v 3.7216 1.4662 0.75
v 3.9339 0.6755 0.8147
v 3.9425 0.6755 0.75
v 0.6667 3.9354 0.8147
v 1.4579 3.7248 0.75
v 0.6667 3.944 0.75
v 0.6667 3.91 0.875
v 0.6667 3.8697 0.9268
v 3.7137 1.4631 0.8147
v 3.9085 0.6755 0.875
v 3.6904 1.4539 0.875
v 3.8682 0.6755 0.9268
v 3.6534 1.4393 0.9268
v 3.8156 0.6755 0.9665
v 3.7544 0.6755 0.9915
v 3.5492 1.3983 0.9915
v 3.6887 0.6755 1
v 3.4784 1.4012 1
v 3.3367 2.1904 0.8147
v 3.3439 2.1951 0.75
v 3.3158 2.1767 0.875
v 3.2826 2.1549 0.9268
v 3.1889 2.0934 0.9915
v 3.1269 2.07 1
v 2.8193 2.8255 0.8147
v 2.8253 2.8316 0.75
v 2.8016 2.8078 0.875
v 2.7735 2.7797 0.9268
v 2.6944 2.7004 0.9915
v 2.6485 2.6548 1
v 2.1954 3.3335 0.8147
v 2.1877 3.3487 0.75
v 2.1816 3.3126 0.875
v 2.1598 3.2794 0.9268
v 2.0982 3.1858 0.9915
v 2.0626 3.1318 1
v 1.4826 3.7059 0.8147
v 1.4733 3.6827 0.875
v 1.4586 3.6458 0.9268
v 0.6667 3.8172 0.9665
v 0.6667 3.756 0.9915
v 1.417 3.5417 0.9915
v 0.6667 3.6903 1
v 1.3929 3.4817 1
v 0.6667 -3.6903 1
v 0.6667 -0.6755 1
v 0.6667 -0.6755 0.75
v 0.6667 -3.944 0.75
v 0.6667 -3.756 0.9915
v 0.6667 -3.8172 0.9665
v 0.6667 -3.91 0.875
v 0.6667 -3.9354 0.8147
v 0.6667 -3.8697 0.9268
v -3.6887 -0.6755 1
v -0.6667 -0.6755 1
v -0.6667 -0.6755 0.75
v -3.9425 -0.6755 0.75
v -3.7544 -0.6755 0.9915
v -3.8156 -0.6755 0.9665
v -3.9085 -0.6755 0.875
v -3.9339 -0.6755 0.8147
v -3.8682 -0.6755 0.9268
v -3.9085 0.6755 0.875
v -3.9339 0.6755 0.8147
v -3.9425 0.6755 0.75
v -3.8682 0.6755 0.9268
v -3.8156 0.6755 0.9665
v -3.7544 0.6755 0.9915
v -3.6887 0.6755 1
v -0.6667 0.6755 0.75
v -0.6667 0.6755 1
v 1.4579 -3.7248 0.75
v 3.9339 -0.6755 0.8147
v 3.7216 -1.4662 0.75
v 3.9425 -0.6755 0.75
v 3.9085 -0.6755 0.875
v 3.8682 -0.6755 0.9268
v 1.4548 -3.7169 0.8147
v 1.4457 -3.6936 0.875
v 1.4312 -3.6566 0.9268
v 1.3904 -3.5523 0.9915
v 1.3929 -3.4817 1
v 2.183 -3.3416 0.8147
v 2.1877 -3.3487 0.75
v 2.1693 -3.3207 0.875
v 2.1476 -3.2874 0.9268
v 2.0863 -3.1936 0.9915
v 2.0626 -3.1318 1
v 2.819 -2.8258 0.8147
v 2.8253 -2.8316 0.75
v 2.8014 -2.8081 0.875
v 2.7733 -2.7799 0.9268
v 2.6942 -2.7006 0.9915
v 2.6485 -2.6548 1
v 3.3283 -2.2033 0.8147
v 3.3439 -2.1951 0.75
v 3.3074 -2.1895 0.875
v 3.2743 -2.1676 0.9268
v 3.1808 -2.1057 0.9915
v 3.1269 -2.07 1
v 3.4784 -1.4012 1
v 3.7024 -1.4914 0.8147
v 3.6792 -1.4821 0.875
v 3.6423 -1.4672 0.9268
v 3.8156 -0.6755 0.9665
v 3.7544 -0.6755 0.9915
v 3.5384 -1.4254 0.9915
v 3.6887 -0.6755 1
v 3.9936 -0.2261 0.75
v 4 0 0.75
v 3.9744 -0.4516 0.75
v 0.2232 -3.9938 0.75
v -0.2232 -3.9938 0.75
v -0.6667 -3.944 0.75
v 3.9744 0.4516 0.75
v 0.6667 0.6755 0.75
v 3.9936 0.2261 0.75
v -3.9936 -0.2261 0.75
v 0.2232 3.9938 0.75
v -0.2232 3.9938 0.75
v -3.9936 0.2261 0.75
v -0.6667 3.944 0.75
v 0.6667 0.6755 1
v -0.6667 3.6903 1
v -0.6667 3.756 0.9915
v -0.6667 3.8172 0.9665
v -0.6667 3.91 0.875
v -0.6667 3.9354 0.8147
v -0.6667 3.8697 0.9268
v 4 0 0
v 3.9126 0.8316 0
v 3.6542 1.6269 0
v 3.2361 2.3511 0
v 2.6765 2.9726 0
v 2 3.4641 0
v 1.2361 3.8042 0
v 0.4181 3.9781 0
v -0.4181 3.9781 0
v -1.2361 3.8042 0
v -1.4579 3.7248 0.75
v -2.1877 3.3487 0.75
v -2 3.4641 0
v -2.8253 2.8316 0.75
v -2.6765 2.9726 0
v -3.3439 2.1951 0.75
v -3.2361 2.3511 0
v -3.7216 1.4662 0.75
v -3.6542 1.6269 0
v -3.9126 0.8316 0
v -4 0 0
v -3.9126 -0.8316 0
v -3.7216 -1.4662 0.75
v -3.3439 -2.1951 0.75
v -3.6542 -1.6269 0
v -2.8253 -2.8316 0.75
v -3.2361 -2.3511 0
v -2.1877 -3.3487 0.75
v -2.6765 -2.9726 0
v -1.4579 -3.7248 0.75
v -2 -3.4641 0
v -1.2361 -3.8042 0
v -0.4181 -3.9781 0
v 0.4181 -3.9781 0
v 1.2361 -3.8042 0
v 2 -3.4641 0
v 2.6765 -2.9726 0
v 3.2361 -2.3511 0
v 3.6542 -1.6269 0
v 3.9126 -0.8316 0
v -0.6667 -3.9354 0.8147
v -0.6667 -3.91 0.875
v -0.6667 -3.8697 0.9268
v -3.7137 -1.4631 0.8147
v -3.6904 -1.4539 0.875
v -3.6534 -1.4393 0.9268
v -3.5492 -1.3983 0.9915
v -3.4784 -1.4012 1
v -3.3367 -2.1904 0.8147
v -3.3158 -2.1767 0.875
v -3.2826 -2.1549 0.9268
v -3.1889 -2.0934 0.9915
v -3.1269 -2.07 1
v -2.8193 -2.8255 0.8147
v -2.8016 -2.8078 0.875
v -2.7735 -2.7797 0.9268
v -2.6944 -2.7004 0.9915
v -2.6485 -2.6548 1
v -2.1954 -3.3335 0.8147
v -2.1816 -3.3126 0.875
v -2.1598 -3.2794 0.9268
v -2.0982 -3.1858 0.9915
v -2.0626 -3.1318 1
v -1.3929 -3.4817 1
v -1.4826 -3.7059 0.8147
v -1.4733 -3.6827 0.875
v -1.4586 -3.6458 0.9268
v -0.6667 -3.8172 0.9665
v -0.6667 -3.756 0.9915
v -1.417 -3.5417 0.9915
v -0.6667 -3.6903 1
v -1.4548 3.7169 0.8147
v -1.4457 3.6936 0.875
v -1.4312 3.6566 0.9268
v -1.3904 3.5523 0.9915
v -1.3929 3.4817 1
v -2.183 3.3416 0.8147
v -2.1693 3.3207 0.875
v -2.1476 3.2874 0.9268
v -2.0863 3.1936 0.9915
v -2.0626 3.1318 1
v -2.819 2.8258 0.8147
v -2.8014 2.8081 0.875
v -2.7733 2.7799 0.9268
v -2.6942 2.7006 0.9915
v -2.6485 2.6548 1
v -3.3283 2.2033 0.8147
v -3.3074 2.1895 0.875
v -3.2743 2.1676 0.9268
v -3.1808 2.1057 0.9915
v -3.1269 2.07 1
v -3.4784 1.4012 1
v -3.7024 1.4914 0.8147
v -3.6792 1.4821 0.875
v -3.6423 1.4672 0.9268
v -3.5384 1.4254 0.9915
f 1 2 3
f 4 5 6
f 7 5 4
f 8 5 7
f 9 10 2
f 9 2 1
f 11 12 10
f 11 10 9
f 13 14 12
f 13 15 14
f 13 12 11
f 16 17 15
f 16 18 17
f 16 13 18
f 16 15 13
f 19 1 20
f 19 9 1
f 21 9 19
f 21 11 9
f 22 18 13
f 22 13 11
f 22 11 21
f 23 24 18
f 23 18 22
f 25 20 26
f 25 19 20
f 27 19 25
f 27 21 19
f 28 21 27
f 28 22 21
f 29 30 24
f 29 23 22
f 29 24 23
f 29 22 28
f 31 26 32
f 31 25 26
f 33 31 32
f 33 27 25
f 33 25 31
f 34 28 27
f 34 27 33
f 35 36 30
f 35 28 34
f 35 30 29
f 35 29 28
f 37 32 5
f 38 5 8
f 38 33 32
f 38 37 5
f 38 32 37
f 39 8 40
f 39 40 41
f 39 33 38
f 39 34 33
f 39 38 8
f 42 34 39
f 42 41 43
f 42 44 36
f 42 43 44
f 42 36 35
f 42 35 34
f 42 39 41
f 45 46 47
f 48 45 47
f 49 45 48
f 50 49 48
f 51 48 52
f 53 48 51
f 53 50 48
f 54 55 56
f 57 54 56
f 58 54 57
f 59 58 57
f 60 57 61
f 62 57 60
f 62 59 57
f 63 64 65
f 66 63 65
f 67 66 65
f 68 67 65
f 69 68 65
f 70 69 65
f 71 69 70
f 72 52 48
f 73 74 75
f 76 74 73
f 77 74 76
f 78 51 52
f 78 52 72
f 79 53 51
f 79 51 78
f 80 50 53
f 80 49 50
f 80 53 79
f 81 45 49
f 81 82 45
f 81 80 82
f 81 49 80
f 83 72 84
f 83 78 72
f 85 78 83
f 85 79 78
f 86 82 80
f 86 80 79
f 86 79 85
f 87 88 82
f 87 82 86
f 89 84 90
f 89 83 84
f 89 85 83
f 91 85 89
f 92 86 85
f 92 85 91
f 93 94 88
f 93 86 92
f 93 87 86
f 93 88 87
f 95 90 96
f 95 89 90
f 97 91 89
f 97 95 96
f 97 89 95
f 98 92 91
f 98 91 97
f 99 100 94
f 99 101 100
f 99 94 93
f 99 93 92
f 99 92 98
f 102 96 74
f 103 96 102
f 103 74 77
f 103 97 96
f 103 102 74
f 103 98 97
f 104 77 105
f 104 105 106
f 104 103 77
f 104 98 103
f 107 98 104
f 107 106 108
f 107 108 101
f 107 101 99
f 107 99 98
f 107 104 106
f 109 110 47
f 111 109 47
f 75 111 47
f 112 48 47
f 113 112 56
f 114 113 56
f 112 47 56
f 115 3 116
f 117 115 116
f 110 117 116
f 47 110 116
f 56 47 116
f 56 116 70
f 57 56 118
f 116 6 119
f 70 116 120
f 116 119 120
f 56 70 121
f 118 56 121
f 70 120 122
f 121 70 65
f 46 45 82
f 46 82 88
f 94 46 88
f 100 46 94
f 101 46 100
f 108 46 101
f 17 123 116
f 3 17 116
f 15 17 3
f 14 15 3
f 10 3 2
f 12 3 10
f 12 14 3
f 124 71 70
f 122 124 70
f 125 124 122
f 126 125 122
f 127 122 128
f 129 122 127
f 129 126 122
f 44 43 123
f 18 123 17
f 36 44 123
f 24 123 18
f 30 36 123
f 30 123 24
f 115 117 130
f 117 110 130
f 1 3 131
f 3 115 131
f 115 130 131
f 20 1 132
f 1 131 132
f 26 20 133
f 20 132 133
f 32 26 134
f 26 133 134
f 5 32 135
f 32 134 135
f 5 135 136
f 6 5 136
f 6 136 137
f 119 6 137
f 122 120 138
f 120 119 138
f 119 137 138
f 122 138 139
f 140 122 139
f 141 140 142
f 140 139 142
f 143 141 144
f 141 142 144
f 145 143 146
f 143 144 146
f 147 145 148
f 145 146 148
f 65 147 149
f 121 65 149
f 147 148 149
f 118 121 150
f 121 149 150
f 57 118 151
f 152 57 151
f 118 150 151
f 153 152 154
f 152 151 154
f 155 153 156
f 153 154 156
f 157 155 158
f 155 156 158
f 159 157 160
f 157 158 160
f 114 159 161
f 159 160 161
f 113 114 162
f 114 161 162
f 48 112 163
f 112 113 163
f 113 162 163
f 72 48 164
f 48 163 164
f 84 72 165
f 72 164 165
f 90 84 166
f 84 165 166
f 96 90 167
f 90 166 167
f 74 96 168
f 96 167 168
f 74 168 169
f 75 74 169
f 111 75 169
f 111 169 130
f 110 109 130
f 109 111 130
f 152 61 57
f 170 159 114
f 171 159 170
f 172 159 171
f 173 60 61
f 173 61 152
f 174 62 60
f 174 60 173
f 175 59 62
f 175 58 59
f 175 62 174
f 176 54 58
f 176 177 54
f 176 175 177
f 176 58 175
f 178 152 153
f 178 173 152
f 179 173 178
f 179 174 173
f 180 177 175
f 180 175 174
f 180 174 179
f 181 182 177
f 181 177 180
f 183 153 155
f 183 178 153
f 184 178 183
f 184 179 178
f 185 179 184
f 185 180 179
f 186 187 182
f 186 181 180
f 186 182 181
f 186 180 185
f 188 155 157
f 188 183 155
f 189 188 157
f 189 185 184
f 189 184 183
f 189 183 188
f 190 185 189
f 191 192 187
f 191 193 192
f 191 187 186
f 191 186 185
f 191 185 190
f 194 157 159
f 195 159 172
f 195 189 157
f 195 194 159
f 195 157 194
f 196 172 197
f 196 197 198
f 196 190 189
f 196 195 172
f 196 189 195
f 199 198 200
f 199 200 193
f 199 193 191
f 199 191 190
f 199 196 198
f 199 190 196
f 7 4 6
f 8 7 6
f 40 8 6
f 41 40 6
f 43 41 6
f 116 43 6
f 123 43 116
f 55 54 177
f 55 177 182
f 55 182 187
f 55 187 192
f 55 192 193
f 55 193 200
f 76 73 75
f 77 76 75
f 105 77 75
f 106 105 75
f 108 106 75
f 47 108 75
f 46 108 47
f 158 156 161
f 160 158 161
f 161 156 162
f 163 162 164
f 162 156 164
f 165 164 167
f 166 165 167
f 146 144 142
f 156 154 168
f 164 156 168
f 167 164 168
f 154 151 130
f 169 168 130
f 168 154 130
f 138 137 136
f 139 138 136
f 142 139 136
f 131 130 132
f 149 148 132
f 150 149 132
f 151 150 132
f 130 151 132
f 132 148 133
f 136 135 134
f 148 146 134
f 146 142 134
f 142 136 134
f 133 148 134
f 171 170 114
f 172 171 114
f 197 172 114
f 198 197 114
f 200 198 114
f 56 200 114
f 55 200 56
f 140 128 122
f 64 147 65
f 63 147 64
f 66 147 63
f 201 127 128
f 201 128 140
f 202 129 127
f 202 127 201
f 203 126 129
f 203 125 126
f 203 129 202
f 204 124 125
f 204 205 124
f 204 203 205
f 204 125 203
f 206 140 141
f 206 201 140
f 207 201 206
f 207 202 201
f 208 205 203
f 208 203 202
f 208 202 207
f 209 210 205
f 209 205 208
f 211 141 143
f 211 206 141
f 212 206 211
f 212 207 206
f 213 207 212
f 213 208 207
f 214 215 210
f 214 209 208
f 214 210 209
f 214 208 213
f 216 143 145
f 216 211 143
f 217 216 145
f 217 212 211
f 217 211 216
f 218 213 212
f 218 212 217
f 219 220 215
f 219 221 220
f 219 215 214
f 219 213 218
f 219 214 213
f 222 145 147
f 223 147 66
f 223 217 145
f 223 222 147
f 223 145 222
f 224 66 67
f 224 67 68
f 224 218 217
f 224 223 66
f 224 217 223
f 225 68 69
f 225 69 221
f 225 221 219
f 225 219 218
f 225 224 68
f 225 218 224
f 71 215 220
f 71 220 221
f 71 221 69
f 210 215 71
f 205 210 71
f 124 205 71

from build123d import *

# Parameters (mm, degrees)
SKETCH1_R           = 4
BOSS_EXTRUDE1_DEPTH = 1
CUT_EXTRUDE1_DEPTH  = 0.25
FILLET1_R           = 0.25


with BuildPart() as part:
    # Sketch1 → Boss-Extrude1 (new body)
    with BuildSketch(Plane.XY):
        Circle(SKETCH1_R)
    extrude(amount=BOSS_EXTRUDE1_DEPTH)

    # Sketch2 → Cut-Extrude1 (cut)
    with BuildSketch(Plane.XY.offset(1)):
        Polygon((-8.106259115, 0.675521593), (-0.666748585, 0.675521593), (-0.666748585, 8.465952431), (0.666748585, 8.465952431), (0.666748585, 0.675521593), (8.106259115, 0.675521593), (8.106259115, -0.675521593), (0.666748585, -0.675521593), (0.666748585, -8.465952431), (-0.666748585, -8.465952431), (-0.666748585, -0.675521593), (-8.106259115, -0.675521593), align=None)
    extrude(amount=-CUT_EXTRUDE1_DEPTH, mode=Mode.SUBTRACT)

    # Fillet1
    fillet1_edges = [part.edges().sort_by_distance(p)[0] for p in [
        (2.825279045, 2.831571704, 1),
        (2.825279045, -2.831571704, 1),
        (-2.825279045, -2.831571704, 1),
        (-2.825279045, 2.831571704, 1),
    ]]
    fillet(fillet1_edges, radius=FILLET1_R)


solid = part.part
